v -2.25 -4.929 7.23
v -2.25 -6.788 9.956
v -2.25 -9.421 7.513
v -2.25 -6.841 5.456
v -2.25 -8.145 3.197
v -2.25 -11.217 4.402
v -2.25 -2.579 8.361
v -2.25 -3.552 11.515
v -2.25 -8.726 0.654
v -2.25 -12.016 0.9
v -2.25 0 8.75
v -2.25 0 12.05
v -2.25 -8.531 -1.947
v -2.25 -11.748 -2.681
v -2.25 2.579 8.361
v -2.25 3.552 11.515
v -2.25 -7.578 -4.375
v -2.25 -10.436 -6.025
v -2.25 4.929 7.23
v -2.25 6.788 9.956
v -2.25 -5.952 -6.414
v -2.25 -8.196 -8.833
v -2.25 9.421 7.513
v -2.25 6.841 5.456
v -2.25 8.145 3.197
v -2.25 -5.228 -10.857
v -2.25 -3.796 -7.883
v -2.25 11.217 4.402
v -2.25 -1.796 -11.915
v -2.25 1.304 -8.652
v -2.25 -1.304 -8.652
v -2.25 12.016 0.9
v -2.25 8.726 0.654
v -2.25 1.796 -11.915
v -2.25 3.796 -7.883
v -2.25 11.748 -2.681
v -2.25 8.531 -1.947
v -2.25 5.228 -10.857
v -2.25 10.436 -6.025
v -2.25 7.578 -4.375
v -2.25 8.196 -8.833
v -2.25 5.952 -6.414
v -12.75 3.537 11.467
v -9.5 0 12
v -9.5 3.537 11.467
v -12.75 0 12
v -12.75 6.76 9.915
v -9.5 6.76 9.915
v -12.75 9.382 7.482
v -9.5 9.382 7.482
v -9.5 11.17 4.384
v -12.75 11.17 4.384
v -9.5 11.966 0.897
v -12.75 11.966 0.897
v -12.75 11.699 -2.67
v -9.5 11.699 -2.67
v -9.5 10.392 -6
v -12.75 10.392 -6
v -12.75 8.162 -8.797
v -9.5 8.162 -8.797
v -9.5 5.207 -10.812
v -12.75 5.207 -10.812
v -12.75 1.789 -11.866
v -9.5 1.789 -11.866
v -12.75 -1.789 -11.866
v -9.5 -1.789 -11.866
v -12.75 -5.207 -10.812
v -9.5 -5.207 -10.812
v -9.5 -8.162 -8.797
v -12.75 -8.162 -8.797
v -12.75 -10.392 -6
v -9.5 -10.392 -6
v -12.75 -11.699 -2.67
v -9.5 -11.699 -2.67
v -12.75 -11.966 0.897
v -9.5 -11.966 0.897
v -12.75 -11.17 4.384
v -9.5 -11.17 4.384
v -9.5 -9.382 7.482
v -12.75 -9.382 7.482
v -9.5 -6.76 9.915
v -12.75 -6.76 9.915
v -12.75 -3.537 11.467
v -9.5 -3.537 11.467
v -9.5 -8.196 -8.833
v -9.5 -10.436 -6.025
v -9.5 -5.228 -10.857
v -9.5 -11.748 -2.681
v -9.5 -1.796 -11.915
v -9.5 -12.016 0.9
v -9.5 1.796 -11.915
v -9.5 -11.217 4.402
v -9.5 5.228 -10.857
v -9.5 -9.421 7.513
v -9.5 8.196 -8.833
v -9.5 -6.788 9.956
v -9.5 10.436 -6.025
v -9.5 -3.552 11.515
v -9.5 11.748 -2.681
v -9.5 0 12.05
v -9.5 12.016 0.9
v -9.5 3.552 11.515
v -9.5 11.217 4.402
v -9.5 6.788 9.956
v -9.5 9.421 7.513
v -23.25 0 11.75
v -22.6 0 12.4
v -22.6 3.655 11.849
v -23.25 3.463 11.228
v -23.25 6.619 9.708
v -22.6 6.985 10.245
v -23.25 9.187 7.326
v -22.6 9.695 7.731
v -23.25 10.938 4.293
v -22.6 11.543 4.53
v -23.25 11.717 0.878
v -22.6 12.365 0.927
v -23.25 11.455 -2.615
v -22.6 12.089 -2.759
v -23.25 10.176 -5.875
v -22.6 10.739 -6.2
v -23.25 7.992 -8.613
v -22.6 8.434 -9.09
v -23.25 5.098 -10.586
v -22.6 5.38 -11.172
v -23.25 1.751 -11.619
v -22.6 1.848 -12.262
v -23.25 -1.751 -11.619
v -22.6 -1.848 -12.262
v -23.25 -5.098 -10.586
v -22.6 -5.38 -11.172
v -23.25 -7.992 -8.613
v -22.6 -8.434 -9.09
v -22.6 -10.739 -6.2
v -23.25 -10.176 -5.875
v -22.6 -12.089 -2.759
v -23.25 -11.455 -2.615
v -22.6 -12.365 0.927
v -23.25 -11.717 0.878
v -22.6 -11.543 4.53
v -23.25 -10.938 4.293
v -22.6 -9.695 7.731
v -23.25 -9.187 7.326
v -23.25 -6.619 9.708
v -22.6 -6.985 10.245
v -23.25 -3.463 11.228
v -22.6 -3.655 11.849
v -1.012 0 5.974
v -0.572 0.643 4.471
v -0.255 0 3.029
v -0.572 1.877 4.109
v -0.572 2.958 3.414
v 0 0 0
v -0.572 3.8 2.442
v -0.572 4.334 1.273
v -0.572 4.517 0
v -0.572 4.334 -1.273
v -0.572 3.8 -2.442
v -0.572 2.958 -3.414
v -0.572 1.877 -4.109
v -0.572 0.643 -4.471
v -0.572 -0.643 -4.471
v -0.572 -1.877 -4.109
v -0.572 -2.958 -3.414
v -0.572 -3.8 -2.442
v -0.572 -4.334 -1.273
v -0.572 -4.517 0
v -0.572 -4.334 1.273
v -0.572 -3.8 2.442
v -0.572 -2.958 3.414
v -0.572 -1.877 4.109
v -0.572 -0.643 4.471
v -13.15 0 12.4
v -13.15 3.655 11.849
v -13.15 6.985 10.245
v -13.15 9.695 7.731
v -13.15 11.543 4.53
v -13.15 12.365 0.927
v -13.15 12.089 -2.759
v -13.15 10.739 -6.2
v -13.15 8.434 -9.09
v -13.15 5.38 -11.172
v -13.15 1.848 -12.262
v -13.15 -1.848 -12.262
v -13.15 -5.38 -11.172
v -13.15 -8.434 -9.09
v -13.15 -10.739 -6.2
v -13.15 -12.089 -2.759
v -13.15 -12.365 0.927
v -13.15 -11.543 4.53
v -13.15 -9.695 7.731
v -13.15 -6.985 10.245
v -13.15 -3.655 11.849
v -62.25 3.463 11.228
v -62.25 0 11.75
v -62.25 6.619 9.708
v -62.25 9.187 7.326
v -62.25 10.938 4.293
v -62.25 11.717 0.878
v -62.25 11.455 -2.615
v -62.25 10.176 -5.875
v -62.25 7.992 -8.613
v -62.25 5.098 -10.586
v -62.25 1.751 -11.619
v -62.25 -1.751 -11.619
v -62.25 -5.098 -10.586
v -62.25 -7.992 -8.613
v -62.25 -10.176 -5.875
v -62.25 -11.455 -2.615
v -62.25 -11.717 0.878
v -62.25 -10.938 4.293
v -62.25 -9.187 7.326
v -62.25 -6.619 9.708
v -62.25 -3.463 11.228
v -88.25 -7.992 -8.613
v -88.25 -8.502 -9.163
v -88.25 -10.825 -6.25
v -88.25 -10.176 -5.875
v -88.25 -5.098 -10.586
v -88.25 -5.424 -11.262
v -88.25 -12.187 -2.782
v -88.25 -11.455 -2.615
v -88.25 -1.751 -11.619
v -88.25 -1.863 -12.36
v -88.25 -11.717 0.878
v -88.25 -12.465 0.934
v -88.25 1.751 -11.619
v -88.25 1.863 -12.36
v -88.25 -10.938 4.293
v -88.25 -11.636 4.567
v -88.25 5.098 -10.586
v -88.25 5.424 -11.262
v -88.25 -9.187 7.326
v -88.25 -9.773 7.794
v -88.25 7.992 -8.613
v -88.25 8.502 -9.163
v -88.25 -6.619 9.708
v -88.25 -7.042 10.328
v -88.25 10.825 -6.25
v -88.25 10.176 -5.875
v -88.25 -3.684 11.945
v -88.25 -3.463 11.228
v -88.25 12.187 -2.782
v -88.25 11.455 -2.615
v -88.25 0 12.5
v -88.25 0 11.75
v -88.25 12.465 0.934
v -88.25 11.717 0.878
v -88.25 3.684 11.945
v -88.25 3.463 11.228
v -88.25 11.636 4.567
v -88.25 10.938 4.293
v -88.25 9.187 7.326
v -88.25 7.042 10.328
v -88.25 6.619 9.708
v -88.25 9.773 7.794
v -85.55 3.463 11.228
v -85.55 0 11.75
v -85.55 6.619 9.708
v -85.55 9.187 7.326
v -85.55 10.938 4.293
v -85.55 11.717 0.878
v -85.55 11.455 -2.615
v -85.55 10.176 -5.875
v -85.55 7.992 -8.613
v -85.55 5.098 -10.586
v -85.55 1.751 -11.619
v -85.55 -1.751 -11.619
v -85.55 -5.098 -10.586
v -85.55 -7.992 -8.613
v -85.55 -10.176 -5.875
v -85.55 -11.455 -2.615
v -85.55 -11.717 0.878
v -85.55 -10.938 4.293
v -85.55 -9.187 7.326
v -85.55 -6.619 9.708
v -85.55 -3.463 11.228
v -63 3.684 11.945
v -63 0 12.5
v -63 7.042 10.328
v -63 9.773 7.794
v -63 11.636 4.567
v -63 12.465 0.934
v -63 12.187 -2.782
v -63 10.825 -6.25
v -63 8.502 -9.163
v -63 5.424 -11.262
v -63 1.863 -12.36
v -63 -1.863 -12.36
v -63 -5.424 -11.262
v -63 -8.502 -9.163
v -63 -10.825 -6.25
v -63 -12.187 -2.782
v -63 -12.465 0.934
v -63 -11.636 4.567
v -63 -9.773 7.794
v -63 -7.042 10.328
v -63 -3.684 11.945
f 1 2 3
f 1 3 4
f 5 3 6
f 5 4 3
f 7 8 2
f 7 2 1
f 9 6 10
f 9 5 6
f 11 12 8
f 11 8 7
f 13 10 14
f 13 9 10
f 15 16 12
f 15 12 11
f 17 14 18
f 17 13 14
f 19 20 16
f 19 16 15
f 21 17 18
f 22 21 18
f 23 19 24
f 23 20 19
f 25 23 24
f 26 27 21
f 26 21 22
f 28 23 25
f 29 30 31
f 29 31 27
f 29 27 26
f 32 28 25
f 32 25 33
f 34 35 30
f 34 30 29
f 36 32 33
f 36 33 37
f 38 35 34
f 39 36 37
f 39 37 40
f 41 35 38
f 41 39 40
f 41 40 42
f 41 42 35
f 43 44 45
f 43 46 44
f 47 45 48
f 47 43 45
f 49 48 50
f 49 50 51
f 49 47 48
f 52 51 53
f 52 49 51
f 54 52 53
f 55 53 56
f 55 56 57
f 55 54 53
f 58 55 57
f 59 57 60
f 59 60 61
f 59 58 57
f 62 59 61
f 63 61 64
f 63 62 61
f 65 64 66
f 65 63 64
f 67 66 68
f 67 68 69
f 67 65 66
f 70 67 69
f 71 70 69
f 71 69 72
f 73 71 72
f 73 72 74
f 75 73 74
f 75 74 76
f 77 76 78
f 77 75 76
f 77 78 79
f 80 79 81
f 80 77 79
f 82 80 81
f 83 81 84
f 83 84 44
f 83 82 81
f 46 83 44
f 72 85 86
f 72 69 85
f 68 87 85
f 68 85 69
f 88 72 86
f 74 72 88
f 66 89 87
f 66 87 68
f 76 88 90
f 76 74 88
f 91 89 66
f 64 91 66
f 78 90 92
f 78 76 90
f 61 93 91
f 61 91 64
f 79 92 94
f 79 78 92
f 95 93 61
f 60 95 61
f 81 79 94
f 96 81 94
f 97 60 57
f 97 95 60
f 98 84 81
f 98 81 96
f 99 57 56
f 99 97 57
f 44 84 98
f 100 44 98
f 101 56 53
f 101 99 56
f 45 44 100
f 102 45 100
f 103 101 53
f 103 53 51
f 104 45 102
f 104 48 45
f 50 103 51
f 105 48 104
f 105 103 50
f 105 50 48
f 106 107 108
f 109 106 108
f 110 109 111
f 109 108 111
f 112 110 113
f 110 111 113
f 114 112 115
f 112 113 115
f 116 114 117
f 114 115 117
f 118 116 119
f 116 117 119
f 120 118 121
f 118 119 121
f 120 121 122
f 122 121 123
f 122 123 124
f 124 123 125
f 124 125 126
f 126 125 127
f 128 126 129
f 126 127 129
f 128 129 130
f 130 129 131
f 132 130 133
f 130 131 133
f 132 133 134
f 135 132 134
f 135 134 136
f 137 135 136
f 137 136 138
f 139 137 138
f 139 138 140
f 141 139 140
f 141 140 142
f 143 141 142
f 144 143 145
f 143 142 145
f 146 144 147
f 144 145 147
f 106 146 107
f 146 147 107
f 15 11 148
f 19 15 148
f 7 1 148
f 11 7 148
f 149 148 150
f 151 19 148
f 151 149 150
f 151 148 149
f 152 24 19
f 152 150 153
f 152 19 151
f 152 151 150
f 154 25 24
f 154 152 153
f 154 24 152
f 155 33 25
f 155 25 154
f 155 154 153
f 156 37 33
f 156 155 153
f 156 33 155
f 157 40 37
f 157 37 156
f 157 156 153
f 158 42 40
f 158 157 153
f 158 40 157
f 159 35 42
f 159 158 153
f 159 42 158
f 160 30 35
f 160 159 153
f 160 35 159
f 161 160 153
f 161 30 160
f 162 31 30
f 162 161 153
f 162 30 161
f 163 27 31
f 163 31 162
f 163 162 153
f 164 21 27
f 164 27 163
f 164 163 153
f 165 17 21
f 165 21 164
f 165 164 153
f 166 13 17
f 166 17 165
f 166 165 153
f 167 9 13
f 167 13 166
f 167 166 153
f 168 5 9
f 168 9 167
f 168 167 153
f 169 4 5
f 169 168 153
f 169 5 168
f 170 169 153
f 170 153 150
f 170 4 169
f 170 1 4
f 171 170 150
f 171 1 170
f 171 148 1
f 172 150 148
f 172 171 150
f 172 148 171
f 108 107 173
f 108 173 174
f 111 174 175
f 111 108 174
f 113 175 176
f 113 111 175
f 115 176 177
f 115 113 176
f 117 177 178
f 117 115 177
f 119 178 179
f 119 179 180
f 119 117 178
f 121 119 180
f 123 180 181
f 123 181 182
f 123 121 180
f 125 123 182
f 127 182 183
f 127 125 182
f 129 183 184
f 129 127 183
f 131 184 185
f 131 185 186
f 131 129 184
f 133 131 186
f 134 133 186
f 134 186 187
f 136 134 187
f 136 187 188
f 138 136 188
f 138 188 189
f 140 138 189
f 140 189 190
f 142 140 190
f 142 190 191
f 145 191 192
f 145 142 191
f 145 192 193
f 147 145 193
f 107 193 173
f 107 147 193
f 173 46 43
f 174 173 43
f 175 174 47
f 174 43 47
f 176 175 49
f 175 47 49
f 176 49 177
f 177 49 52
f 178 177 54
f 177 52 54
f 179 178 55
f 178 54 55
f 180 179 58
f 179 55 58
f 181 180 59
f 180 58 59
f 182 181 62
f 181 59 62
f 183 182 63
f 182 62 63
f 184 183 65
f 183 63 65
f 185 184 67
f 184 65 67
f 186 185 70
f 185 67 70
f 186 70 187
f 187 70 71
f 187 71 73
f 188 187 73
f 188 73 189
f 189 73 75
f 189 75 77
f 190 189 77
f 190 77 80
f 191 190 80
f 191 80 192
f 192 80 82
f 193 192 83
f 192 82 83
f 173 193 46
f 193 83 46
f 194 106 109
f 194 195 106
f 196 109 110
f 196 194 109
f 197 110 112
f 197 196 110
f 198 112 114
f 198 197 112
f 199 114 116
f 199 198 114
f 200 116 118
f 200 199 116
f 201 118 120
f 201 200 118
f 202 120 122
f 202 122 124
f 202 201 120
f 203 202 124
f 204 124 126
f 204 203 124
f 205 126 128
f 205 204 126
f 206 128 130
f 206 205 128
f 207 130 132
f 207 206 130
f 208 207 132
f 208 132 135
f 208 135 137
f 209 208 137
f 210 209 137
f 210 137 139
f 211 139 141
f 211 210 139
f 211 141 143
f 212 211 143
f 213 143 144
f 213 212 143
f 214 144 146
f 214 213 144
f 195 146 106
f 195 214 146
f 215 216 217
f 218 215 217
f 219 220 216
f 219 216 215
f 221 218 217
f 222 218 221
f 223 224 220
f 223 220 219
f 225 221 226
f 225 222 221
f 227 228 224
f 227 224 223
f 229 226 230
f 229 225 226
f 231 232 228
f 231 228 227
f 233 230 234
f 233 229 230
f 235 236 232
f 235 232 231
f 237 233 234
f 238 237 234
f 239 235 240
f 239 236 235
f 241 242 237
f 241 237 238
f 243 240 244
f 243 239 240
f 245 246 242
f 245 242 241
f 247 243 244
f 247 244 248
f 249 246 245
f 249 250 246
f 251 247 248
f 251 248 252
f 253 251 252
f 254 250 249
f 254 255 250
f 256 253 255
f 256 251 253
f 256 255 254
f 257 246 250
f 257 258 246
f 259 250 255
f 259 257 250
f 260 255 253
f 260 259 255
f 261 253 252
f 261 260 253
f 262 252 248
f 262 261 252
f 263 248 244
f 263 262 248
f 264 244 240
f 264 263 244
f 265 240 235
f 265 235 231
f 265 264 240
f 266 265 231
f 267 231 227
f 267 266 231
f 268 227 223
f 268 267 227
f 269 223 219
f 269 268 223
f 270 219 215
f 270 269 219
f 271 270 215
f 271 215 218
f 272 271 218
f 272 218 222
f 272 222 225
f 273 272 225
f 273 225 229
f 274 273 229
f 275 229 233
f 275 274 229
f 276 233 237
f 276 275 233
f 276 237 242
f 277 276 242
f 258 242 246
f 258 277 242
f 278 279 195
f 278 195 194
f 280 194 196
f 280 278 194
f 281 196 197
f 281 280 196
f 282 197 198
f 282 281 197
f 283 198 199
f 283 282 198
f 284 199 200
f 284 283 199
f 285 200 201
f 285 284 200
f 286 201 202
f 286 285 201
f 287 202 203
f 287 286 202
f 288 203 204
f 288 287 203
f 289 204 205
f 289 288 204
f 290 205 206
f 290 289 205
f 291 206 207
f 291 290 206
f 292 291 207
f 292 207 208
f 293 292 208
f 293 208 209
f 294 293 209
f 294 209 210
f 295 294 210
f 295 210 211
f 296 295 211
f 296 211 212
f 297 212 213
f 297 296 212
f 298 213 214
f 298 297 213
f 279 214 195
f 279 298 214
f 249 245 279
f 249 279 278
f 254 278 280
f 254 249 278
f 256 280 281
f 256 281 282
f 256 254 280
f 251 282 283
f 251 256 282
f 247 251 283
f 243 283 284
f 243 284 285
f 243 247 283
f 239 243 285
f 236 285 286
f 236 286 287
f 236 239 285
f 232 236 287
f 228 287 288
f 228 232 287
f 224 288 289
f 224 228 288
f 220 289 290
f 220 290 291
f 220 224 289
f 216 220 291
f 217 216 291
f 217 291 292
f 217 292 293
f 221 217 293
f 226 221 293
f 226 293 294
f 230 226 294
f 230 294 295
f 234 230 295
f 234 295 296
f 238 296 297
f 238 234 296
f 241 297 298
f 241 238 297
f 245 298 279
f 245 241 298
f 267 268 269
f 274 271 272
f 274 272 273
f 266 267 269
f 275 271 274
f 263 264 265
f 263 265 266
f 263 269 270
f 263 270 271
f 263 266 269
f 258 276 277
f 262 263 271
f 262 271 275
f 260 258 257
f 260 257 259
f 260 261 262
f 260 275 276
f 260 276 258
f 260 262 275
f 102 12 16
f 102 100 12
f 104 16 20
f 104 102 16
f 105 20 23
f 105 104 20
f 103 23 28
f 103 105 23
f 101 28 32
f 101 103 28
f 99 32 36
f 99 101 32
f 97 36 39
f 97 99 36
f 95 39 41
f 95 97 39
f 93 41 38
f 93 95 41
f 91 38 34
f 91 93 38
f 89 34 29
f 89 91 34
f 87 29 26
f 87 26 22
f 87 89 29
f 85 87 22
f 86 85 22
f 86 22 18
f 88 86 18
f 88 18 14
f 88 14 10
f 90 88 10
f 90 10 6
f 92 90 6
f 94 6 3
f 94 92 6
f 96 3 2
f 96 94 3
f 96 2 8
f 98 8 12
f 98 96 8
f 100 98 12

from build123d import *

# Parameters (mm, degrees)
F2_SIZE = 0.74999
F3_SIZE = 0.64999
F4_SIZE = 0.39999


# Not quite as in the source:
# - a fillet or chamfer is up to 0.001 mm smaller than in the source, because OpenCascade refuses the exact size


with BuildPart() as f1:
    # F0 (on Front) → F1 (revolve)
    with BuildSketch(Plane.XZ):
        with BuildLine():
            Line((-85.55, 11.75), (-85.55, 0))
            Line((-85.55, 0), (0, 0))
            ThreePointArc((0, 0), (-0.5715031948, 4.5173277499), (-2.25, 8.75))
            Line((-2.25, 8.75), (-2.25, 12.05))
            Line((-2.25, 12.05), (-9.5, 12.05))
            Line((-9.5, 12.05), (-9.5, 12))
            Line((-9.5, 12), (-12.75, 12))
            Line((-12.75, 12), (-12.75, 12.4))
            Line((-12.75, 12.4), (-23.25, 12.4))
            Line((-23.25, 12.4), (-23.25, 11.75))
            Line((-23.25, 11.75), (-62.25, 11.75))
            Line((-62.25, 11.75), (-62.25, 12.5))
            Line((-62.25, 12.5), (-88.25, 12.5))
            Line((-88.25, 12.5), (-88.25, 11.75))
            Line((-88.25, 11.75), (-85.55, 11.75))
        make_face()
    revolve(axis=Axis((-46.3619604707, 0, 0), (-1, 0, 0)))

    # F2 (size 0.75 in the source; OpenCascade refuses exactly that, so slightly less here)
    f2_edges = [f1.edges().sort_by_distance(p)[0] for p in [
        (-62.25, 0, -12.5),
    ]]
    chamfer(f2_edges, length=F2_SIZE)

    # F3 (size 0.65 in the source; OpenCascade refuses exactly that, so slightly less here)
    f3_edges = [f1.edges().sort_by_distance(p)[0] for p in [
        (-23.25, 0, -12.4),
    ]]
    chamfer(f3_edges, length=F3_SIZE)

    # F4 (size 0.4 in the source; OpenCascade refuses exactly that, so slightly less here)
    f4_edges = [f1.edges().sort_by_distance(p)[0] for p in [
        (-12.75, 0, -12.4),
    ]]
    chamfer(f4_edges, length=F4_SIZE)


solid = f1.part
